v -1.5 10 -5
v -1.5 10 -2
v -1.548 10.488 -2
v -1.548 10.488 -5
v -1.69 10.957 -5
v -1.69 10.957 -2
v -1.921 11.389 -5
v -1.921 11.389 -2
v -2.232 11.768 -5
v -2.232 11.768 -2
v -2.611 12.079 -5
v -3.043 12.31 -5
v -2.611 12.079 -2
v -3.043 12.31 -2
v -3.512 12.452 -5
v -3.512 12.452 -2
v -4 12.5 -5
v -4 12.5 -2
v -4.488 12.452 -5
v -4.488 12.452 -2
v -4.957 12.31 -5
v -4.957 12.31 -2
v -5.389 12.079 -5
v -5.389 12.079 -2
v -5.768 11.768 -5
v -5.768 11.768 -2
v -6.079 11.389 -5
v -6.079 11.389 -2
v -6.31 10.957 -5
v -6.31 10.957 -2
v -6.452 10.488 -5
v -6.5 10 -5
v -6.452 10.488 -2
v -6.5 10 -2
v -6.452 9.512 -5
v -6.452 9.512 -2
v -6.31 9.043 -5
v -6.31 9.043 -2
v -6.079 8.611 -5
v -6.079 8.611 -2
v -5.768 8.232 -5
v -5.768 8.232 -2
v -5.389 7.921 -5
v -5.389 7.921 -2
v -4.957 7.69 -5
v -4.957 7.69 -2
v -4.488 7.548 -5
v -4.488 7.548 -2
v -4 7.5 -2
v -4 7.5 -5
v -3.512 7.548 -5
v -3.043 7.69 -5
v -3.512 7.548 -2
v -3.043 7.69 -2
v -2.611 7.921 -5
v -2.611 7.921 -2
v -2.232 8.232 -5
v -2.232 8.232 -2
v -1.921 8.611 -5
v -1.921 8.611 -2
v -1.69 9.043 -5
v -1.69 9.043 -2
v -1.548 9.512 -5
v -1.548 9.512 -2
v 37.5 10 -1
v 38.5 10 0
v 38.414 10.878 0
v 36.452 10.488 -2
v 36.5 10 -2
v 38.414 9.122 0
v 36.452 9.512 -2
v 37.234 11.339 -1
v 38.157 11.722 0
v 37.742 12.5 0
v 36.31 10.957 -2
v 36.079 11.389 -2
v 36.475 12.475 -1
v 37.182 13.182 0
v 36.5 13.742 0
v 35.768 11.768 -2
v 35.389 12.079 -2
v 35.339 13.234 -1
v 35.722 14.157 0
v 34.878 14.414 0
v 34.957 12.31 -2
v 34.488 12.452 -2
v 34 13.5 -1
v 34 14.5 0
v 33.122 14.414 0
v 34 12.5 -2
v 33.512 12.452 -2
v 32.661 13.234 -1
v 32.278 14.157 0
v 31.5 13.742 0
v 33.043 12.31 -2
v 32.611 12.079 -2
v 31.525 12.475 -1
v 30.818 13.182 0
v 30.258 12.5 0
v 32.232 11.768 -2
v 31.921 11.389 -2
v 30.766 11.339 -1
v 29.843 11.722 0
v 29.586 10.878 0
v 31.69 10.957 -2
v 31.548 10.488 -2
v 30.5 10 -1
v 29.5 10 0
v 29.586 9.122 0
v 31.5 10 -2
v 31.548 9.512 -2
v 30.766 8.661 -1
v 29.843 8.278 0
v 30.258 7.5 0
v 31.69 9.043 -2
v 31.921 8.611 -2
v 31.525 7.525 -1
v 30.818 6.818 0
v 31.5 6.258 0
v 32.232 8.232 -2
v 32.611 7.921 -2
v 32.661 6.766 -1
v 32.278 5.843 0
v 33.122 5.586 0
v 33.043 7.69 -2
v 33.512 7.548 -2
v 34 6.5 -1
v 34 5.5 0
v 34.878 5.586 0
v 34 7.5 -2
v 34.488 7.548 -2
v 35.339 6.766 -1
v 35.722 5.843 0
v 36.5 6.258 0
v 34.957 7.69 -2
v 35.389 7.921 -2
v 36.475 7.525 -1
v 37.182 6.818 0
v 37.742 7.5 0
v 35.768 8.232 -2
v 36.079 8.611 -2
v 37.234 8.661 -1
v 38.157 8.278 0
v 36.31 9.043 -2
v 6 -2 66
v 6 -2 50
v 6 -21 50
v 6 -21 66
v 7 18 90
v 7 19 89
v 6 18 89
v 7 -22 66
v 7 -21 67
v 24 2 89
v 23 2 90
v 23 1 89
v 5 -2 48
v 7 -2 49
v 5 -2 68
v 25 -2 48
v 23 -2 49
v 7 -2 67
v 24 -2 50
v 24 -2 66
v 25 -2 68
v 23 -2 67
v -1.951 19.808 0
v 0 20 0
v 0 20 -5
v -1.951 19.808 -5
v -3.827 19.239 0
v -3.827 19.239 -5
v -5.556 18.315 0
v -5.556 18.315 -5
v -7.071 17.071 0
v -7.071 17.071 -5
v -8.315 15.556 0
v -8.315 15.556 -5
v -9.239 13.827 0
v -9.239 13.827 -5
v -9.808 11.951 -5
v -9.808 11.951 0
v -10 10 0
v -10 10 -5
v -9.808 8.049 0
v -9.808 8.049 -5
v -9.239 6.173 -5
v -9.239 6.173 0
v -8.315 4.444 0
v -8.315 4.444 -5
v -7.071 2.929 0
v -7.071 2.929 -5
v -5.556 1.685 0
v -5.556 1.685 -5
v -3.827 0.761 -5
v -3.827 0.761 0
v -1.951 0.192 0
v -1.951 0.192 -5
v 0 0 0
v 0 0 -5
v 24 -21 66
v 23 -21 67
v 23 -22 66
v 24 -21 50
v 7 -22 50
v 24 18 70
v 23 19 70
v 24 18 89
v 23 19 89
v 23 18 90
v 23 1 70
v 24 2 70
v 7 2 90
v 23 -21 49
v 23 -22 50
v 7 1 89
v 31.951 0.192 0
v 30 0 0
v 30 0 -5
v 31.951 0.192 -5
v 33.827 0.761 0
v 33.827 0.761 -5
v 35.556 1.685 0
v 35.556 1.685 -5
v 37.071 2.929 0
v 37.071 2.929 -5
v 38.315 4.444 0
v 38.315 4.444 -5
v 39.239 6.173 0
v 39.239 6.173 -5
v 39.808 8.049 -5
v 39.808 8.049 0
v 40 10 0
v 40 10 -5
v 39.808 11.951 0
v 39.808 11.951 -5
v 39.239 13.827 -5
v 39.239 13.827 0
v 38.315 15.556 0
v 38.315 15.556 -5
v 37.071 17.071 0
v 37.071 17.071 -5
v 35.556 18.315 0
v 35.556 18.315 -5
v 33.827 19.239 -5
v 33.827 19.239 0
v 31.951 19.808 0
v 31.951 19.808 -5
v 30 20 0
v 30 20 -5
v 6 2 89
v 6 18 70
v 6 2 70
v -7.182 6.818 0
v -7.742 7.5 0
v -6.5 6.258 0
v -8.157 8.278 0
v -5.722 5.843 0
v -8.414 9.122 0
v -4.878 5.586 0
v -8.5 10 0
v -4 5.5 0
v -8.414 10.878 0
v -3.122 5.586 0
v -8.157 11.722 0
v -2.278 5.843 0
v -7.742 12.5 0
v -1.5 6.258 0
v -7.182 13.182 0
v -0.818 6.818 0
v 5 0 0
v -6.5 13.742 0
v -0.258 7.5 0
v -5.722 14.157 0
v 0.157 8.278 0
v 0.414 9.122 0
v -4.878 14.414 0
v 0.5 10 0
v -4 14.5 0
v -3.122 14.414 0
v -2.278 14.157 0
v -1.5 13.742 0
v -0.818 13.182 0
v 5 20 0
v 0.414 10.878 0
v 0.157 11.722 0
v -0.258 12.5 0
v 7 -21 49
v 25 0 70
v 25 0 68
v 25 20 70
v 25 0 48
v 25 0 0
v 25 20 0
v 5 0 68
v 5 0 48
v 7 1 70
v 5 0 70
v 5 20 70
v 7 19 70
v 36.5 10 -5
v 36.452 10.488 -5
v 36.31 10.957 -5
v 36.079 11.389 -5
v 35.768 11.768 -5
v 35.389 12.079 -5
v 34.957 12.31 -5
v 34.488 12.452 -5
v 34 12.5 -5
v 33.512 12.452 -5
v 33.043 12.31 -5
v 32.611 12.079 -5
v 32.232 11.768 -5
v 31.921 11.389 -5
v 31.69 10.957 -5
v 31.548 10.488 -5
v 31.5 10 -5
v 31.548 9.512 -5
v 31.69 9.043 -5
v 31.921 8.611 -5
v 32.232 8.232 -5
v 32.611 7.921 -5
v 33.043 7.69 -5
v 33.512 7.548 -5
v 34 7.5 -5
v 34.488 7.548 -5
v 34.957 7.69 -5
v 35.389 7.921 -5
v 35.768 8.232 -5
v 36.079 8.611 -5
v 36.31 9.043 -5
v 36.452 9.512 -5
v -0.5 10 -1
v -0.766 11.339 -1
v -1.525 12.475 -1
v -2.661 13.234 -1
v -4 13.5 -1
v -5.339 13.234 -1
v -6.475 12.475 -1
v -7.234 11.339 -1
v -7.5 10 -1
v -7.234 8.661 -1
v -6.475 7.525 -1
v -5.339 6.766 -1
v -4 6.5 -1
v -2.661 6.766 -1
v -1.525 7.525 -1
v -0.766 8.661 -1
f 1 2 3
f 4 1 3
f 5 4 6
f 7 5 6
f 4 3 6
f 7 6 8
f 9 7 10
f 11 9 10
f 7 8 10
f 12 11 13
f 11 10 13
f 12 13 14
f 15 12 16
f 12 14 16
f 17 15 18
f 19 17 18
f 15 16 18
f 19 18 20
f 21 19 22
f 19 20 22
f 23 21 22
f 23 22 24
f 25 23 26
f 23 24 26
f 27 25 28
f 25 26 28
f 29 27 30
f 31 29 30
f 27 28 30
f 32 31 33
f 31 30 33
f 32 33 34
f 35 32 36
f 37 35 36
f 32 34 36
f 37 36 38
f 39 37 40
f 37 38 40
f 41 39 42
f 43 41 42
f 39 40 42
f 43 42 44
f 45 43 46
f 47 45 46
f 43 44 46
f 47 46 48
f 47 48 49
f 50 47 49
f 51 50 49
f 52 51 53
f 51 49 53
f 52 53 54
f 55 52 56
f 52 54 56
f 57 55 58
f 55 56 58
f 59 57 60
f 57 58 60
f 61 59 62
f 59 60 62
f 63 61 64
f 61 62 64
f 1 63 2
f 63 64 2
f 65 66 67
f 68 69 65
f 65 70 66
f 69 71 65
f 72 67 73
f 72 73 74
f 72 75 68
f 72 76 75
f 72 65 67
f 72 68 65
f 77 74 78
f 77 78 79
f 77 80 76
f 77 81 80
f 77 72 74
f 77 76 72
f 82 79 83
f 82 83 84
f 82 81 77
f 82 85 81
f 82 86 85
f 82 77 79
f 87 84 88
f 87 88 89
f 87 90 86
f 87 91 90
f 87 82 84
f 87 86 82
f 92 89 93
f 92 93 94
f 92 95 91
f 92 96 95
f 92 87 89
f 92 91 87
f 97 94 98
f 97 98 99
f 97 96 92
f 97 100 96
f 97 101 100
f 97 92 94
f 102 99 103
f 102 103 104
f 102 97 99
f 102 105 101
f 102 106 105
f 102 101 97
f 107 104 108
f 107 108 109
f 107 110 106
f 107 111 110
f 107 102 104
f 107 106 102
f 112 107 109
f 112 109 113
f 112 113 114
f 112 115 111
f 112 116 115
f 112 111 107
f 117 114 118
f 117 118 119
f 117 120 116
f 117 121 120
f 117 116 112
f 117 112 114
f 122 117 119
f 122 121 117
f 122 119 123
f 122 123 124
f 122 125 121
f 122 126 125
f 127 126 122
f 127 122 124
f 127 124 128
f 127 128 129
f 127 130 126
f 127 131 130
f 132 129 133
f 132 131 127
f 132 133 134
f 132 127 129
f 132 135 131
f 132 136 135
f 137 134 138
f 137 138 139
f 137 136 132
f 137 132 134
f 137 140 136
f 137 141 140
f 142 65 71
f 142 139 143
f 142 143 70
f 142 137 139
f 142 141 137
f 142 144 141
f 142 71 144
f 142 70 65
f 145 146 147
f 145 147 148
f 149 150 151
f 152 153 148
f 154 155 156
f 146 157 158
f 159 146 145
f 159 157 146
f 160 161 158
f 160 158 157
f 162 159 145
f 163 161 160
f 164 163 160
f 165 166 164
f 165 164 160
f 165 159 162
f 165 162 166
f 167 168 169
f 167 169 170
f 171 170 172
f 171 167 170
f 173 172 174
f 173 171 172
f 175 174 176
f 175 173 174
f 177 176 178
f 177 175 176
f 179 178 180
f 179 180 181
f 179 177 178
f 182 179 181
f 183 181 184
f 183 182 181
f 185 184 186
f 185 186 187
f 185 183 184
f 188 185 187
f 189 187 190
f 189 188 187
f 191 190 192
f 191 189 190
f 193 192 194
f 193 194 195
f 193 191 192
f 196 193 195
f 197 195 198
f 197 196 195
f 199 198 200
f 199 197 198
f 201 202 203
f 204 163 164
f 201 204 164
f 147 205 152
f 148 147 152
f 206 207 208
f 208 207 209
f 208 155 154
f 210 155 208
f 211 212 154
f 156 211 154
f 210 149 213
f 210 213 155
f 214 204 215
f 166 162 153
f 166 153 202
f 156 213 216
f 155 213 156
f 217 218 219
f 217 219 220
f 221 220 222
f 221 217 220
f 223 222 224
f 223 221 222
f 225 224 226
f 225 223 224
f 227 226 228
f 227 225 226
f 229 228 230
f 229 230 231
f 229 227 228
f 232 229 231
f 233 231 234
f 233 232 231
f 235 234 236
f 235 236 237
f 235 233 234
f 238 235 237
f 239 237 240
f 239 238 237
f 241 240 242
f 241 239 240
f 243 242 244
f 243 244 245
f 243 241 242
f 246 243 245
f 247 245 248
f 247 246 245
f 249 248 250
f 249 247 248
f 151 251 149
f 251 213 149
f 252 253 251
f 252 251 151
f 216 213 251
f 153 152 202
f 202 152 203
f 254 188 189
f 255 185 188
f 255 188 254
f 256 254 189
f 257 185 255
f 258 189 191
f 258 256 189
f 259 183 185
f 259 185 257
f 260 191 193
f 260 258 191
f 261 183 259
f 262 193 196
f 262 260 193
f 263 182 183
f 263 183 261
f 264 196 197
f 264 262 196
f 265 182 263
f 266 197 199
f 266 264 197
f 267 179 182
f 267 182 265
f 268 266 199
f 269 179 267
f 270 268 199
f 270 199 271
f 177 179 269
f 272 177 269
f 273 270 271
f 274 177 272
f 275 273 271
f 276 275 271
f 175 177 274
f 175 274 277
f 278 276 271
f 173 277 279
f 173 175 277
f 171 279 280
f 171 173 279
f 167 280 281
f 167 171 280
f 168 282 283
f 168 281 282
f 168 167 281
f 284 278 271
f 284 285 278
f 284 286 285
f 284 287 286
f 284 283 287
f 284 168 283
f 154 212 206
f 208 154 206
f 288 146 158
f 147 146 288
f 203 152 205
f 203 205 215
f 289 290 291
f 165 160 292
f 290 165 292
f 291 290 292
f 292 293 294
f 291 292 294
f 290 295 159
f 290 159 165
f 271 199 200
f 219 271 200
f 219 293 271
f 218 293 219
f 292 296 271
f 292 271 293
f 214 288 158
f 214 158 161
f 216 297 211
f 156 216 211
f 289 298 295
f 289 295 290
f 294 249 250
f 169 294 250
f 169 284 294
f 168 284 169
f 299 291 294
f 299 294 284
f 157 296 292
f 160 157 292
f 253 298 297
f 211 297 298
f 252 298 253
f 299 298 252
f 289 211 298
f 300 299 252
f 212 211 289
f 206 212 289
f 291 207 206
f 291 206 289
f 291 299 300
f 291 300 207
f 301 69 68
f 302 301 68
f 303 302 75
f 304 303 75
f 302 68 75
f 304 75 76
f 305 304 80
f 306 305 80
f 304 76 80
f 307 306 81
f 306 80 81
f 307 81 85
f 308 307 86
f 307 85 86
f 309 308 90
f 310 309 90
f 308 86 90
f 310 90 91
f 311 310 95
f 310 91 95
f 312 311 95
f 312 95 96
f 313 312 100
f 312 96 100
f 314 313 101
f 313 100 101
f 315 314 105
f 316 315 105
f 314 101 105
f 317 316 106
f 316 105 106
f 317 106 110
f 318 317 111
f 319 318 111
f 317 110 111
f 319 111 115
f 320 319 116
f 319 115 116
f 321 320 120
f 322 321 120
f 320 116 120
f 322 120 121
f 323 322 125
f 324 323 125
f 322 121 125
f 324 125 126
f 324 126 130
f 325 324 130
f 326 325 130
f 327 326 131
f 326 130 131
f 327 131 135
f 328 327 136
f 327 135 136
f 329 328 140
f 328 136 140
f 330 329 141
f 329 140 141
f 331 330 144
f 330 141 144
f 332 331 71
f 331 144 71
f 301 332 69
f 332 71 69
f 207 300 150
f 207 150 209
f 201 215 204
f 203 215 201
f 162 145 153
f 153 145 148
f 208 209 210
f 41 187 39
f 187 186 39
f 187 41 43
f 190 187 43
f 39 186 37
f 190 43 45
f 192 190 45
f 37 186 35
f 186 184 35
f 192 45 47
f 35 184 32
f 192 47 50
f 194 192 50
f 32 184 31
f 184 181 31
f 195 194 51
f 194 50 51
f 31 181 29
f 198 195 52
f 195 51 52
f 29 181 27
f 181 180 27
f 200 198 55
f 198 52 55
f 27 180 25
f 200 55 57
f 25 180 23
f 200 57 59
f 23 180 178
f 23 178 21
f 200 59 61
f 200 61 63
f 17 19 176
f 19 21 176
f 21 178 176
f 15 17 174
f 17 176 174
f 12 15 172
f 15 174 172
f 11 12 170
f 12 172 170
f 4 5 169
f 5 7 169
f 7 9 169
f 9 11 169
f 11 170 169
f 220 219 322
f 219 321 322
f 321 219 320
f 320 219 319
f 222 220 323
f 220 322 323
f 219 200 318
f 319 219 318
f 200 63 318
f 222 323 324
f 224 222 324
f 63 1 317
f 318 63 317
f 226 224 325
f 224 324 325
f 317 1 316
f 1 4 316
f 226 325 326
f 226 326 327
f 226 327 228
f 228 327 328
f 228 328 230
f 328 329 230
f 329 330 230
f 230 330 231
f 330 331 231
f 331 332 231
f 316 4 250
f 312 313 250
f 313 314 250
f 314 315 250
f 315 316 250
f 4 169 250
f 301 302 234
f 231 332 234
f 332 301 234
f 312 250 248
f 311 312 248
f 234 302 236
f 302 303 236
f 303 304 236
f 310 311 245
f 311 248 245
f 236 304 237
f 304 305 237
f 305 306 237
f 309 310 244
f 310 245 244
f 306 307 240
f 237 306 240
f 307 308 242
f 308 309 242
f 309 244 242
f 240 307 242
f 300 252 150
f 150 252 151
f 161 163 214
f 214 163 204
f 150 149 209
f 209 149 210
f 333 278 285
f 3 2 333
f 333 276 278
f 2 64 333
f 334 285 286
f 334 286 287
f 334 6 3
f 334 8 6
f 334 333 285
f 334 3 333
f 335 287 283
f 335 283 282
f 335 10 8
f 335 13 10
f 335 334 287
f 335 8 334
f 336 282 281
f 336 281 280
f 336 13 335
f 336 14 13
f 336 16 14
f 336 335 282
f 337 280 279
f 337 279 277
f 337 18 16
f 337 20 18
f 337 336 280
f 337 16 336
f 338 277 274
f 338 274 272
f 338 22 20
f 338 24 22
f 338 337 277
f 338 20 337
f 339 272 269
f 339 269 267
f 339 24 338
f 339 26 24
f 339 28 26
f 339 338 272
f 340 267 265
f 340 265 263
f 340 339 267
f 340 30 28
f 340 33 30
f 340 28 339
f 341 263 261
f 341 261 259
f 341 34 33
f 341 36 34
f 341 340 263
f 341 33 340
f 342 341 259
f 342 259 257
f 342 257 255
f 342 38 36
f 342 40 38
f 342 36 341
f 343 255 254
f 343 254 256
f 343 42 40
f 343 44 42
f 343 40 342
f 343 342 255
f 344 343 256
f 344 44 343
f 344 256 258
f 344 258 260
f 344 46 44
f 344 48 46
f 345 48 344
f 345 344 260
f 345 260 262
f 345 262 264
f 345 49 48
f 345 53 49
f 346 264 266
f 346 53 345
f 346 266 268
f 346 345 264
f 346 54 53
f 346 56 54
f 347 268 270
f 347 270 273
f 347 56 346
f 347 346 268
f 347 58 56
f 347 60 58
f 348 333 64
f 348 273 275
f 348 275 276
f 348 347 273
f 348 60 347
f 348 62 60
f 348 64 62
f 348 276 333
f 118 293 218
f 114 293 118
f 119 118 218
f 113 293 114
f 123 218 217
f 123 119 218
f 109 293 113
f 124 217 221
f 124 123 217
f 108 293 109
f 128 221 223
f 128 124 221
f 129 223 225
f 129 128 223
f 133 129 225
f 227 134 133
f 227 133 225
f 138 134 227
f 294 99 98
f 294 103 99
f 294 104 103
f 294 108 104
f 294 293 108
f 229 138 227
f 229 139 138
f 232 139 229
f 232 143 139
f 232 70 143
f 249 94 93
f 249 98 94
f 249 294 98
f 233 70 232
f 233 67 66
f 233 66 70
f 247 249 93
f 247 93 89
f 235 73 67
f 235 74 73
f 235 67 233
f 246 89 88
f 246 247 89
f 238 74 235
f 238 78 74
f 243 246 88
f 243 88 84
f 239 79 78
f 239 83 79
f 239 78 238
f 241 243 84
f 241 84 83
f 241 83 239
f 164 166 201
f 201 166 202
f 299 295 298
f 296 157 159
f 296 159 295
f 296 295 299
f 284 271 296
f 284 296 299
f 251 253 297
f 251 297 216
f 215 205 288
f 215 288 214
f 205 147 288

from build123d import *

# Parameters (mm, degrees)
F0_W      = 20
F0_H      = 20
F1_DEPTH  = 70
F0_W_2    = 5
F0_R      = 2.5
F2_DEPTH  = 5
F3_W      = 18
F3_H      = 18
F4_DEPTH  = 20
F5_W      = 20
F5_H      = 20
F6_DEPTH  = 2
F7_SIZE   = 2
F8_SIZE   = 1
F9_W      = 18
F9_H      = 18
F10_DEPTH = 20
F11_SIZE  = 1


with BuildPart() as f1:
    # F0 (on Top) → F1 (new body)
    with BuildSketch(Plane.XY):
        with Locations((15, 10)):
            Rectangle(F0_W, F0_H)
    extrude(amount=F1_DEPTH)

    # F0 (on Top) → F2 (join)
    with BuildSketch(Plane.XY):
        with Locations((2.5, 10)):
            Rectangle(F0_W_2, F0_H)
        with BuildLine():
            ThreePointArc((0, 20), (-10, 10), (0, 0))
            Line((0, 0), (0, 20))
        make_face()
        with Locations((-4, 10)):
            Circle(F0_R, mode=Mode.SUBTRACT)
        with Locations((15, 10)):
            Rectangle(F0_W, F0_H)
        with Locations((27.5, 10)):
            Rectangle(F0_W_2, F0_H)
        with BuildLine():
            Line((30, 20), (30, 0))
            ThreePointArc((30, 0), (40, 10), (30, 20))
        make_face()
        with Locations((34, 10)):
            Circle(F0_R, mode=Mode.SUBTRACT)
    extrude(amount=-F2_DEPTH)

    # F3 (on face) → F4 (join)
    with BuildSketch(Plane.XY.offset(70)):
        with Locations((15, 10)):
            Rectangle(F3_W, F3_H)
    extrude(amount=F4_DEPTH)

    # F5 (on face) → F6 (join)
    with BuildSketch(Plane.XZ):
        with Locations((15, 58)):
            Rectangle(F5_W, F5_H)
    extrude(amount=F6_DEPTH)

    # F7
    f7_edges = [f1.edges().sort_by_distance(p)[0] for p in [
        (31.5, 10, 0),
        (-6.5, 10, 0),
    ]]
    chamfer(f7_edges, length=F7_SIZE)

    # F8
    f8_edges = [f1.edges().sort_by_distance(p)[0] for p in [
        (24, 19, 80),
        (6, 19, 80),
        (15, 19, 90),
        (6, 10, 90),
        (24, 10, 90),
        (15, 1, 90),
        (24, 1, 80),
        (6, 1, 80),
    ]]
    chamfer(f8_edges, length=F8_SIZE)

    # F9 (on face) → F10 (join)
    with BuildSketch(Plane.XZ.offset(2)):
        with Locations((15, 58)):
            Rectangle(F9_W, F9_H)
    extrude(amount=F10_DEPTH)

    # F11
    f11_edges = [f1.edges().sort_by_distance(p)[0] for p in [
        (24, -12, 67),
        (15, -22, 67),
        (6, -12, 67),
        (24, -22, 58),
        (24, -12, 49),
        (6, -12, 49),
        (6, -22, 58),
        (15, -22, 49),
    ]]
    chamfer(f11_edges, length=F11_SIZE)


solid = f1.part
